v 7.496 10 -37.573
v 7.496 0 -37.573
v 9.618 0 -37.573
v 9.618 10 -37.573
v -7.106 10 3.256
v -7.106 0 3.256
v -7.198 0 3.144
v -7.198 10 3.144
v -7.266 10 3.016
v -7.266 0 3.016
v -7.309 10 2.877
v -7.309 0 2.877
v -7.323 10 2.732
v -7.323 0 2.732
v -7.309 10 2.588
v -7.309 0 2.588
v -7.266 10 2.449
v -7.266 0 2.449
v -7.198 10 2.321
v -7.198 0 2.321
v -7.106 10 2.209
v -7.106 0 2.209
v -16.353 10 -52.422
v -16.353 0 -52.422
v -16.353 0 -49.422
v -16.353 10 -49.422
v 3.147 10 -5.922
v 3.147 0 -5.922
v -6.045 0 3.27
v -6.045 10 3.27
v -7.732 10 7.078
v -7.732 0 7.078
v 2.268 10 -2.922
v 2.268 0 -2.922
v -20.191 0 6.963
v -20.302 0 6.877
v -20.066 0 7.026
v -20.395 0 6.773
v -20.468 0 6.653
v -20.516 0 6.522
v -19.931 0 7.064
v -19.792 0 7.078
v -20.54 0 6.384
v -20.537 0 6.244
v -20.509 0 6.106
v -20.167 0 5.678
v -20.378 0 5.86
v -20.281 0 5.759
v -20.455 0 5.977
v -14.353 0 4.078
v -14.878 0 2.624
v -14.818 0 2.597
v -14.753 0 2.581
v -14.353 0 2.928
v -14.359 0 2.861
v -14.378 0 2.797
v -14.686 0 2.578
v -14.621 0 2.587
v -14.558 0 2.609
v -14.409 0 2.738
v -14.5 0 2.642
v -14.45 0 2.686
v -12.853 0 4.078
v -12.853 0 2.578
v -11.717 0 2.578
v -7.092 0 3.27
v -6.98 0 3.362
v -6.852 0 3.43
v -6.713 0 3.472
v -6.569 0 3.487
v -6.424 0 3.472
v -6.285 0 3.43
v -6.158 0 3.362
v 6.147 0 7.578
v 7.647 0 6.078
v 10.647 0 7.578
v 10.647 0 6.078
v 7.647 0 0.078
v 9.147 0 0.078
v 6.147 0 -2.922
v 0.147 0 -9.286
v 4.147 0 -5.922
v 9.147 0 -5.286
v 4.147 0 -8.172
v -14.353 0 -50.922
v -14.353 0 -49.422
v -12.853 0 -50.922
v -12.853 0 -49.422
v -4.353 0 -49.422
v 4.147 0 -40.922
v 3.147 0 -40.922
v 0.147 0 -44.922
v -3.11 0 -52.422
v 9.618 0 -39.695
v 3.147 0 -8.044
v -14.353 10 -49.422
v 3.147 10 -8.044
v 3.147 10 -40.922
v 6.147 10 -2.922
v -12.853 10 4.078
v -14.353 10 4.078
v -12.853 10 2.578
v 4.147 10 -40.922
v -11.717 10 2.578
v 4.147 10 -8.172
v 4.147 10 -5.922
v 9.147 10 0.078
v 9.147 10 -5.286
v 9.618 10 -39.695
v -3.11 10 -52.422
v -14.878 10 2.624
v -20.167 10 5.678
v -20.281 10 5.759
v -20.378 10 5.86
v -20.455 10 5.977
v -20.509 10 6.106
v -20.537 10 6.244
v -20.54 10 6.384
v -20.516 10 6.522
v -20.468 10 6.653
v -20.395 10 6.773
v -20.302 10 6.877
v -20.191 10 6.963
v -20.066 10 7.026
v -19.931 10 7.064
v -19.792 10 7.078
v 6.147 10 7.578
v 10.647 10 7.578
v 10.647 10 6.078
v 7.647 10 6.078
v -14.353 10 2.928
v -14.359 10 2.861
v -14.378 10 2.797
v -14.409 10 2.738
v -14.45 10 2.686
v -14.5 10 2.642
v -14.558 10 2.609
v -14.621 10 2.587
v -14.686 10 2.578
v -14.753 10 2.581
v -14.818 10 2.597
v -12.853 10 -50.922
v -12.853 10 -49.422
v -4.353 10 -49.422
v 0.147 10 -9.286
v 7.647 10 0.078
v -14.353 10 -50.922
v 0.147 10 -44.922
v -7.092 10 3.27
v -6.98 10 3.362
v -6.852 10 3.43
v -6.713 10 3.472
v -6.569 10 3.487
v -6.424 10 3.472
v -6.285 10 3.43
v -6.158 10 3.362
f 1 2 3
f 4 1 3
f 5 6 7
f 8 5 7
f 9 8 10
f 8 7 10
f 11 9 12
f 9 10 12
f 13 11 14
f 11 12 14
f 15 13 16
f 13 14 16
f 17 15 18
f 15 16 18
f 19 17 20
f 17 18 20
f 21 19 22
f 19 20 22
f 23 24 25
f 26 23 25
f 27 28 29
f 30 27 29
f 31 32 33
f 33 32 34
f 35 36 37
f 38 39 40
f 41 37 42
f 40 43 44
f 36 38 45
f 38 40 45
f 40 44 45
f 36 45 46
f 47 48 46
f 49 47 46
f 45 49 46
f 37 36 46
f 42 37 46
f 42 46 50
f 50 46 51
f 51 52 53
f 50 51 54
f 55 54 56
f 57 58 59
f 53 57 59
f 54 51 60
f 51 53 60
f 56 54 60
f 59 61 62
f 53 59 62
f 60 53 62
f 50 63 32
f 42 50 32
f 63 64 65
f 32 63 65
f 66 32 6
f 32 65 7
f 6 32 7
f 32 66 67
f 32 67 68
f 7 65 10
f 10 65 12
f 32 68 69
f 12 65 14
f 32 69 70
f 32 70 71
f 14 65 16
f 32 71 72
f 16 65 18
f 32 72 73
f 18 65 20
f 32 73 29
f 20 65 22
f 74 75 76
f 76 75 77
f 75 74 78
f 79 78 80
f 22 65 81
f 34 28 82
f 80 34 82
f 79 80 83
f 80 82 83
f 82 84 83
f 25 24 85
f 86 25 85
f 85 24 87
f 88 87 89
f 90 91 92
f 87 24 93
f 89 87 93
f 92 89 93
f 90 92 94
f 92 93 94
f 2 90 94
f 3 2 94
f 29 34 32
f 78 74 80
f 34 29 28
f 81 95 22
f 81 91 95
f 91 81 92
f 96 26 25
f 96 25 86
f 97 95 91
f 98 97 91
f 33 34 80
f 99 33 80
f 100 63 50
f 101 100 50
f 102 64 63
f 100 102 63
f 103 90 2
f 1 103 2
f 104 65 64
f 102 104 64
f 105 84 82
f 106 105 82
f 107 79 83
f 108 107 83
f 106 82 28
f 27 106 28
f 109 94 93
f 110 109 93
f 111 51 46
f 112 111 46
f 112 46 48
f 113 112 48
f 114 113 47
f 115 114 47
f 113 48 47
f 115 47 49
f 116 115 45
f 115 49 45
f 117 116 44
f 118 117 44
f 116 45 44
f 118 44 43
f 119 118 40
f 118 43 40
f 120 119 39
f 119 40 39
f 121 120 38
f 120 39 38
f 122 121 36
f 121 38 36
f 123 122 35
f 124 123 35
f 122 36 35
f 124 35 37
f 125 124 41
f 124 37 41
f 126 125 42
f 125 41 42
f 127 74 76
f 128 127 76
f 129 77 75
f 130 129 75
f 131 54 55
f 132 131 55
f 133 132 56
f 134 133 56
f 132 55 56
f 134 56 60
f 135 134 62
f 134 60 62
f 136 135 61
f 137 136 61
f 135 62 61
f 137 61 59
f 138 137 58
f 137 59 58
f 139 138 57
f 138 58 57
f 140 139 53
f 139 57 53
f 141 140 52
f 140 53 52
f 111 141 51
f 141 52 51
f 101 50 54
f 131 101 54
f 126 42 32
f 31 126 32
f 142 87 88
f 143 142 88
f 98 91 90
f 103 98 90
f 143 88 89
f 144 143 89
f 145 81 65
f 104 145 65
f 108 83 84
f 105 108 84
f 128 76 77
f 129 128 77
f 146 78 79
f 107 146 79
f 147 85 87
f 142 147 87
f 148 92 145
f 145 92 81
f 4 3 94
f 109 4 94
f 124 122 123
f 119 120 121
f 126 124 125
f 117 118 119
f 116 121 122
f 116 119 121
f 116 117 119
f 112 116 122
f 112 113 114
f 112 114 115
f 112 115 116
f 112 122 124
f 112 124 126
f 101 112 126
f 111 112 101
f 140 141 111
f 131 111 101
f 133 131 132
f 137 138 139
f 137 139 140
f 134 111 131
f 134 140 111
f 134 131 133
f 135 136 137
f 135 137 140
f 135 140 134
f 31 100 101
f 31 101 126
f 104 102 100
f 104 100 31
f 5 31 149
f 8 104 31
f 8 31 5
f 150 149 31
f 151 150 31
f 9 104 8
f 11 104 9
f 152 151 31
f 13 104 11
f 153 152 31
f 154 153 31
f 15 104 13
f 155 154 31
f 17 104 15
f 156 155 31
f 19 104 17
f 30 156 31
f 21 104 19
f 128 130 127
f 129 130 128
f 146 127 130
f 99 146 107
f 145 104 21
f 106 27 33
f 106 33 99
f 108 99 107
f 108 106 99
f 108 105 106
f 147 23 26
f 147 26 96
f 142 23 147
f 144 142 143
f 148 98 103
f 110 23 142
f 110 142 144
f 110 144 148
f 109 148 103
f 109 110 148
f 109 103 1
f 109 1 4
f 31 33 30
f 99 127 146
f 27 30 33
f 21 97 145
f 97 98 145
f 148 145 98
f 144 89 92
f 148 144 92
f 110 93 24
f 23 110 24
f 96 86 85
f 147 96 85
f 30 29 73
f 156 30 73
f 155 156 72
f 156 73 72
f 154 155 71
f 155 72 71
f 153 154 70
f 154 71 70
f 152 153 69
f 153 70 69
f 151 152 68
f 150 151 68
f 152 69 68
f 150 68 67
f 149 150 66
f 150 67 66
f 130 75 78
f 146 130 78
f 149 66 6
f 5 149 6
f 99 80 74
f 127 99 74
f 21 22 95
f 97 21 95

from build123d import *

# Parameters (mm, degrees)
EXTRUDE_2_DEPTH = 10


with BuildPart() as part:
    # Эскиз2 → Бобышка-Вытянуть2 (new body)
    with BuildSketch(Plane(origin=(0, 0, 0), x_dir=(1, 0, 0), z_dir=(0, 1, 0))):
        with BuildLine():
            Line((-12.853030774, -2.577511611), (-12.853030774, -4.077511611))
            Line((-12.853030774, -4.077511611), (-14.353030774, -4.077511611))
            Line((-14.353030774, -4.077511611), (-14.353030774, -2.927511611))
            ThreePointArc((-14.353030774, -2.927511611), (-14.528030774, -2.624402719), (-14.878030774, -2.624402719))
            Line((-14.878030774, -2.624402719), (-20.16700352, -5.677992558))
            ThreePointArc((-20.16700352, -5.677992558), (-20.516447889, -6.521625894), (-19.79200352, -7.077511611))
            Line((-19.79200352, -7.077511611), (-7.73171043, -7.077511611))
            Line((-7.73171043, -7.077511611), (2.26828957, 2.922488389))
            Line((2.26828957, 2.922488389), (6.146969226, 2.922488389))
            Line((6.146969226, 2.922488389), (6.146969226, -7.577511611))
            Line((6.146969226, -7.577511611), (10.646969226, -7.577511611))
            Line((10.646969226, -7.577511611), (10.646969226, -6.077511611))
            Line((10.646969226, -6.077511611), (7.646969226, -6.077511611))
            Line((7.646969226, -6.077511611), (7.646969226, -0.077511611))
            Line((7.646969226, -0.077511611), (9.146969226, -0.077511611))
            Line((9.146969226, -0.077511611), (9.146969226, 5.285737044))
            Line((9.146969226, 5.285737044), (4.146969226, 8.172488389))
            Line((4.146969226, 8.172488389), (4.146969226, 5.922488389))
            Line((4.146969226, 5.922488389), (3.146969226, 5.922488389))
            Line((3.146969226, 5.922488389), (-6.045418929, -3.269899766))
            ThreePointArc((-6.045418929, -3.269899766), (-6.568677947, -3.486640748), (-7.091936965, -3.269899766))
            Line((-7.091936965, -3.269899766), (-7.106079101, -3.25575763))
            ThreePointArc((-7.106079101, -3.25575763), (-7.322820083, -2.732498612), (-7.106079101, -2.209239594))
            Line((-7.106079101, -2.209239594), (3.146969226, 8.043808733))
            Line((3.146969226, 8.043808733), (3.146969226, 40.922488389))
            Line((3.146969226, 40.922488389), (4.146969226, 40.922488389))
            Line((4.146969226, 40.922488389), (7.496211631, 37.573245985))
            Line((7.496211631, 37.573245985), (9.617531975, 37.573245985))
            Line((9.617531975, 37.573245985), (9.617531975, 39.694566328))
            Line((9.617531975, 39.694566328), (-3.110390087, 52.422488389))
            Line((-3.110390087, 52.422488389), (-16.353030774, 52.422488389))
            Line((-16.353030774, 52.422488389), (-16.353030774, 49.422488389))
            Line((-16.353030774, 49.422488389), (-14.353030774, 49.422488389))
            Line((-14.353030774, 49.422488389), (-14.353030774, 50.922488389))
            Line((-14.353030774, 50.922488389), (-12.853030774, 50.922488389))
            Line((-12.853030774, 50.922488389), (-12.853030774, 49.422488389))
            Line((-12.853030774, 49.422488389), (-4.353030774, 49.422488389))
            Line((-4.353030774, 49.422488389), (0.146969226, 44.922488389))
            Line((0.146969226, 44.922488389), (0.146969226, 9.28644942))
            Line((0.146969226, 9.28644942), (-11.716991804, -2.577511611))
            Line((-11.716991804, -2.577511611), (-12.853030774, -2.577511611))
        make_face()
    extrude(amount=EXTRUDE_2_DEPTH)


solid = part.part
